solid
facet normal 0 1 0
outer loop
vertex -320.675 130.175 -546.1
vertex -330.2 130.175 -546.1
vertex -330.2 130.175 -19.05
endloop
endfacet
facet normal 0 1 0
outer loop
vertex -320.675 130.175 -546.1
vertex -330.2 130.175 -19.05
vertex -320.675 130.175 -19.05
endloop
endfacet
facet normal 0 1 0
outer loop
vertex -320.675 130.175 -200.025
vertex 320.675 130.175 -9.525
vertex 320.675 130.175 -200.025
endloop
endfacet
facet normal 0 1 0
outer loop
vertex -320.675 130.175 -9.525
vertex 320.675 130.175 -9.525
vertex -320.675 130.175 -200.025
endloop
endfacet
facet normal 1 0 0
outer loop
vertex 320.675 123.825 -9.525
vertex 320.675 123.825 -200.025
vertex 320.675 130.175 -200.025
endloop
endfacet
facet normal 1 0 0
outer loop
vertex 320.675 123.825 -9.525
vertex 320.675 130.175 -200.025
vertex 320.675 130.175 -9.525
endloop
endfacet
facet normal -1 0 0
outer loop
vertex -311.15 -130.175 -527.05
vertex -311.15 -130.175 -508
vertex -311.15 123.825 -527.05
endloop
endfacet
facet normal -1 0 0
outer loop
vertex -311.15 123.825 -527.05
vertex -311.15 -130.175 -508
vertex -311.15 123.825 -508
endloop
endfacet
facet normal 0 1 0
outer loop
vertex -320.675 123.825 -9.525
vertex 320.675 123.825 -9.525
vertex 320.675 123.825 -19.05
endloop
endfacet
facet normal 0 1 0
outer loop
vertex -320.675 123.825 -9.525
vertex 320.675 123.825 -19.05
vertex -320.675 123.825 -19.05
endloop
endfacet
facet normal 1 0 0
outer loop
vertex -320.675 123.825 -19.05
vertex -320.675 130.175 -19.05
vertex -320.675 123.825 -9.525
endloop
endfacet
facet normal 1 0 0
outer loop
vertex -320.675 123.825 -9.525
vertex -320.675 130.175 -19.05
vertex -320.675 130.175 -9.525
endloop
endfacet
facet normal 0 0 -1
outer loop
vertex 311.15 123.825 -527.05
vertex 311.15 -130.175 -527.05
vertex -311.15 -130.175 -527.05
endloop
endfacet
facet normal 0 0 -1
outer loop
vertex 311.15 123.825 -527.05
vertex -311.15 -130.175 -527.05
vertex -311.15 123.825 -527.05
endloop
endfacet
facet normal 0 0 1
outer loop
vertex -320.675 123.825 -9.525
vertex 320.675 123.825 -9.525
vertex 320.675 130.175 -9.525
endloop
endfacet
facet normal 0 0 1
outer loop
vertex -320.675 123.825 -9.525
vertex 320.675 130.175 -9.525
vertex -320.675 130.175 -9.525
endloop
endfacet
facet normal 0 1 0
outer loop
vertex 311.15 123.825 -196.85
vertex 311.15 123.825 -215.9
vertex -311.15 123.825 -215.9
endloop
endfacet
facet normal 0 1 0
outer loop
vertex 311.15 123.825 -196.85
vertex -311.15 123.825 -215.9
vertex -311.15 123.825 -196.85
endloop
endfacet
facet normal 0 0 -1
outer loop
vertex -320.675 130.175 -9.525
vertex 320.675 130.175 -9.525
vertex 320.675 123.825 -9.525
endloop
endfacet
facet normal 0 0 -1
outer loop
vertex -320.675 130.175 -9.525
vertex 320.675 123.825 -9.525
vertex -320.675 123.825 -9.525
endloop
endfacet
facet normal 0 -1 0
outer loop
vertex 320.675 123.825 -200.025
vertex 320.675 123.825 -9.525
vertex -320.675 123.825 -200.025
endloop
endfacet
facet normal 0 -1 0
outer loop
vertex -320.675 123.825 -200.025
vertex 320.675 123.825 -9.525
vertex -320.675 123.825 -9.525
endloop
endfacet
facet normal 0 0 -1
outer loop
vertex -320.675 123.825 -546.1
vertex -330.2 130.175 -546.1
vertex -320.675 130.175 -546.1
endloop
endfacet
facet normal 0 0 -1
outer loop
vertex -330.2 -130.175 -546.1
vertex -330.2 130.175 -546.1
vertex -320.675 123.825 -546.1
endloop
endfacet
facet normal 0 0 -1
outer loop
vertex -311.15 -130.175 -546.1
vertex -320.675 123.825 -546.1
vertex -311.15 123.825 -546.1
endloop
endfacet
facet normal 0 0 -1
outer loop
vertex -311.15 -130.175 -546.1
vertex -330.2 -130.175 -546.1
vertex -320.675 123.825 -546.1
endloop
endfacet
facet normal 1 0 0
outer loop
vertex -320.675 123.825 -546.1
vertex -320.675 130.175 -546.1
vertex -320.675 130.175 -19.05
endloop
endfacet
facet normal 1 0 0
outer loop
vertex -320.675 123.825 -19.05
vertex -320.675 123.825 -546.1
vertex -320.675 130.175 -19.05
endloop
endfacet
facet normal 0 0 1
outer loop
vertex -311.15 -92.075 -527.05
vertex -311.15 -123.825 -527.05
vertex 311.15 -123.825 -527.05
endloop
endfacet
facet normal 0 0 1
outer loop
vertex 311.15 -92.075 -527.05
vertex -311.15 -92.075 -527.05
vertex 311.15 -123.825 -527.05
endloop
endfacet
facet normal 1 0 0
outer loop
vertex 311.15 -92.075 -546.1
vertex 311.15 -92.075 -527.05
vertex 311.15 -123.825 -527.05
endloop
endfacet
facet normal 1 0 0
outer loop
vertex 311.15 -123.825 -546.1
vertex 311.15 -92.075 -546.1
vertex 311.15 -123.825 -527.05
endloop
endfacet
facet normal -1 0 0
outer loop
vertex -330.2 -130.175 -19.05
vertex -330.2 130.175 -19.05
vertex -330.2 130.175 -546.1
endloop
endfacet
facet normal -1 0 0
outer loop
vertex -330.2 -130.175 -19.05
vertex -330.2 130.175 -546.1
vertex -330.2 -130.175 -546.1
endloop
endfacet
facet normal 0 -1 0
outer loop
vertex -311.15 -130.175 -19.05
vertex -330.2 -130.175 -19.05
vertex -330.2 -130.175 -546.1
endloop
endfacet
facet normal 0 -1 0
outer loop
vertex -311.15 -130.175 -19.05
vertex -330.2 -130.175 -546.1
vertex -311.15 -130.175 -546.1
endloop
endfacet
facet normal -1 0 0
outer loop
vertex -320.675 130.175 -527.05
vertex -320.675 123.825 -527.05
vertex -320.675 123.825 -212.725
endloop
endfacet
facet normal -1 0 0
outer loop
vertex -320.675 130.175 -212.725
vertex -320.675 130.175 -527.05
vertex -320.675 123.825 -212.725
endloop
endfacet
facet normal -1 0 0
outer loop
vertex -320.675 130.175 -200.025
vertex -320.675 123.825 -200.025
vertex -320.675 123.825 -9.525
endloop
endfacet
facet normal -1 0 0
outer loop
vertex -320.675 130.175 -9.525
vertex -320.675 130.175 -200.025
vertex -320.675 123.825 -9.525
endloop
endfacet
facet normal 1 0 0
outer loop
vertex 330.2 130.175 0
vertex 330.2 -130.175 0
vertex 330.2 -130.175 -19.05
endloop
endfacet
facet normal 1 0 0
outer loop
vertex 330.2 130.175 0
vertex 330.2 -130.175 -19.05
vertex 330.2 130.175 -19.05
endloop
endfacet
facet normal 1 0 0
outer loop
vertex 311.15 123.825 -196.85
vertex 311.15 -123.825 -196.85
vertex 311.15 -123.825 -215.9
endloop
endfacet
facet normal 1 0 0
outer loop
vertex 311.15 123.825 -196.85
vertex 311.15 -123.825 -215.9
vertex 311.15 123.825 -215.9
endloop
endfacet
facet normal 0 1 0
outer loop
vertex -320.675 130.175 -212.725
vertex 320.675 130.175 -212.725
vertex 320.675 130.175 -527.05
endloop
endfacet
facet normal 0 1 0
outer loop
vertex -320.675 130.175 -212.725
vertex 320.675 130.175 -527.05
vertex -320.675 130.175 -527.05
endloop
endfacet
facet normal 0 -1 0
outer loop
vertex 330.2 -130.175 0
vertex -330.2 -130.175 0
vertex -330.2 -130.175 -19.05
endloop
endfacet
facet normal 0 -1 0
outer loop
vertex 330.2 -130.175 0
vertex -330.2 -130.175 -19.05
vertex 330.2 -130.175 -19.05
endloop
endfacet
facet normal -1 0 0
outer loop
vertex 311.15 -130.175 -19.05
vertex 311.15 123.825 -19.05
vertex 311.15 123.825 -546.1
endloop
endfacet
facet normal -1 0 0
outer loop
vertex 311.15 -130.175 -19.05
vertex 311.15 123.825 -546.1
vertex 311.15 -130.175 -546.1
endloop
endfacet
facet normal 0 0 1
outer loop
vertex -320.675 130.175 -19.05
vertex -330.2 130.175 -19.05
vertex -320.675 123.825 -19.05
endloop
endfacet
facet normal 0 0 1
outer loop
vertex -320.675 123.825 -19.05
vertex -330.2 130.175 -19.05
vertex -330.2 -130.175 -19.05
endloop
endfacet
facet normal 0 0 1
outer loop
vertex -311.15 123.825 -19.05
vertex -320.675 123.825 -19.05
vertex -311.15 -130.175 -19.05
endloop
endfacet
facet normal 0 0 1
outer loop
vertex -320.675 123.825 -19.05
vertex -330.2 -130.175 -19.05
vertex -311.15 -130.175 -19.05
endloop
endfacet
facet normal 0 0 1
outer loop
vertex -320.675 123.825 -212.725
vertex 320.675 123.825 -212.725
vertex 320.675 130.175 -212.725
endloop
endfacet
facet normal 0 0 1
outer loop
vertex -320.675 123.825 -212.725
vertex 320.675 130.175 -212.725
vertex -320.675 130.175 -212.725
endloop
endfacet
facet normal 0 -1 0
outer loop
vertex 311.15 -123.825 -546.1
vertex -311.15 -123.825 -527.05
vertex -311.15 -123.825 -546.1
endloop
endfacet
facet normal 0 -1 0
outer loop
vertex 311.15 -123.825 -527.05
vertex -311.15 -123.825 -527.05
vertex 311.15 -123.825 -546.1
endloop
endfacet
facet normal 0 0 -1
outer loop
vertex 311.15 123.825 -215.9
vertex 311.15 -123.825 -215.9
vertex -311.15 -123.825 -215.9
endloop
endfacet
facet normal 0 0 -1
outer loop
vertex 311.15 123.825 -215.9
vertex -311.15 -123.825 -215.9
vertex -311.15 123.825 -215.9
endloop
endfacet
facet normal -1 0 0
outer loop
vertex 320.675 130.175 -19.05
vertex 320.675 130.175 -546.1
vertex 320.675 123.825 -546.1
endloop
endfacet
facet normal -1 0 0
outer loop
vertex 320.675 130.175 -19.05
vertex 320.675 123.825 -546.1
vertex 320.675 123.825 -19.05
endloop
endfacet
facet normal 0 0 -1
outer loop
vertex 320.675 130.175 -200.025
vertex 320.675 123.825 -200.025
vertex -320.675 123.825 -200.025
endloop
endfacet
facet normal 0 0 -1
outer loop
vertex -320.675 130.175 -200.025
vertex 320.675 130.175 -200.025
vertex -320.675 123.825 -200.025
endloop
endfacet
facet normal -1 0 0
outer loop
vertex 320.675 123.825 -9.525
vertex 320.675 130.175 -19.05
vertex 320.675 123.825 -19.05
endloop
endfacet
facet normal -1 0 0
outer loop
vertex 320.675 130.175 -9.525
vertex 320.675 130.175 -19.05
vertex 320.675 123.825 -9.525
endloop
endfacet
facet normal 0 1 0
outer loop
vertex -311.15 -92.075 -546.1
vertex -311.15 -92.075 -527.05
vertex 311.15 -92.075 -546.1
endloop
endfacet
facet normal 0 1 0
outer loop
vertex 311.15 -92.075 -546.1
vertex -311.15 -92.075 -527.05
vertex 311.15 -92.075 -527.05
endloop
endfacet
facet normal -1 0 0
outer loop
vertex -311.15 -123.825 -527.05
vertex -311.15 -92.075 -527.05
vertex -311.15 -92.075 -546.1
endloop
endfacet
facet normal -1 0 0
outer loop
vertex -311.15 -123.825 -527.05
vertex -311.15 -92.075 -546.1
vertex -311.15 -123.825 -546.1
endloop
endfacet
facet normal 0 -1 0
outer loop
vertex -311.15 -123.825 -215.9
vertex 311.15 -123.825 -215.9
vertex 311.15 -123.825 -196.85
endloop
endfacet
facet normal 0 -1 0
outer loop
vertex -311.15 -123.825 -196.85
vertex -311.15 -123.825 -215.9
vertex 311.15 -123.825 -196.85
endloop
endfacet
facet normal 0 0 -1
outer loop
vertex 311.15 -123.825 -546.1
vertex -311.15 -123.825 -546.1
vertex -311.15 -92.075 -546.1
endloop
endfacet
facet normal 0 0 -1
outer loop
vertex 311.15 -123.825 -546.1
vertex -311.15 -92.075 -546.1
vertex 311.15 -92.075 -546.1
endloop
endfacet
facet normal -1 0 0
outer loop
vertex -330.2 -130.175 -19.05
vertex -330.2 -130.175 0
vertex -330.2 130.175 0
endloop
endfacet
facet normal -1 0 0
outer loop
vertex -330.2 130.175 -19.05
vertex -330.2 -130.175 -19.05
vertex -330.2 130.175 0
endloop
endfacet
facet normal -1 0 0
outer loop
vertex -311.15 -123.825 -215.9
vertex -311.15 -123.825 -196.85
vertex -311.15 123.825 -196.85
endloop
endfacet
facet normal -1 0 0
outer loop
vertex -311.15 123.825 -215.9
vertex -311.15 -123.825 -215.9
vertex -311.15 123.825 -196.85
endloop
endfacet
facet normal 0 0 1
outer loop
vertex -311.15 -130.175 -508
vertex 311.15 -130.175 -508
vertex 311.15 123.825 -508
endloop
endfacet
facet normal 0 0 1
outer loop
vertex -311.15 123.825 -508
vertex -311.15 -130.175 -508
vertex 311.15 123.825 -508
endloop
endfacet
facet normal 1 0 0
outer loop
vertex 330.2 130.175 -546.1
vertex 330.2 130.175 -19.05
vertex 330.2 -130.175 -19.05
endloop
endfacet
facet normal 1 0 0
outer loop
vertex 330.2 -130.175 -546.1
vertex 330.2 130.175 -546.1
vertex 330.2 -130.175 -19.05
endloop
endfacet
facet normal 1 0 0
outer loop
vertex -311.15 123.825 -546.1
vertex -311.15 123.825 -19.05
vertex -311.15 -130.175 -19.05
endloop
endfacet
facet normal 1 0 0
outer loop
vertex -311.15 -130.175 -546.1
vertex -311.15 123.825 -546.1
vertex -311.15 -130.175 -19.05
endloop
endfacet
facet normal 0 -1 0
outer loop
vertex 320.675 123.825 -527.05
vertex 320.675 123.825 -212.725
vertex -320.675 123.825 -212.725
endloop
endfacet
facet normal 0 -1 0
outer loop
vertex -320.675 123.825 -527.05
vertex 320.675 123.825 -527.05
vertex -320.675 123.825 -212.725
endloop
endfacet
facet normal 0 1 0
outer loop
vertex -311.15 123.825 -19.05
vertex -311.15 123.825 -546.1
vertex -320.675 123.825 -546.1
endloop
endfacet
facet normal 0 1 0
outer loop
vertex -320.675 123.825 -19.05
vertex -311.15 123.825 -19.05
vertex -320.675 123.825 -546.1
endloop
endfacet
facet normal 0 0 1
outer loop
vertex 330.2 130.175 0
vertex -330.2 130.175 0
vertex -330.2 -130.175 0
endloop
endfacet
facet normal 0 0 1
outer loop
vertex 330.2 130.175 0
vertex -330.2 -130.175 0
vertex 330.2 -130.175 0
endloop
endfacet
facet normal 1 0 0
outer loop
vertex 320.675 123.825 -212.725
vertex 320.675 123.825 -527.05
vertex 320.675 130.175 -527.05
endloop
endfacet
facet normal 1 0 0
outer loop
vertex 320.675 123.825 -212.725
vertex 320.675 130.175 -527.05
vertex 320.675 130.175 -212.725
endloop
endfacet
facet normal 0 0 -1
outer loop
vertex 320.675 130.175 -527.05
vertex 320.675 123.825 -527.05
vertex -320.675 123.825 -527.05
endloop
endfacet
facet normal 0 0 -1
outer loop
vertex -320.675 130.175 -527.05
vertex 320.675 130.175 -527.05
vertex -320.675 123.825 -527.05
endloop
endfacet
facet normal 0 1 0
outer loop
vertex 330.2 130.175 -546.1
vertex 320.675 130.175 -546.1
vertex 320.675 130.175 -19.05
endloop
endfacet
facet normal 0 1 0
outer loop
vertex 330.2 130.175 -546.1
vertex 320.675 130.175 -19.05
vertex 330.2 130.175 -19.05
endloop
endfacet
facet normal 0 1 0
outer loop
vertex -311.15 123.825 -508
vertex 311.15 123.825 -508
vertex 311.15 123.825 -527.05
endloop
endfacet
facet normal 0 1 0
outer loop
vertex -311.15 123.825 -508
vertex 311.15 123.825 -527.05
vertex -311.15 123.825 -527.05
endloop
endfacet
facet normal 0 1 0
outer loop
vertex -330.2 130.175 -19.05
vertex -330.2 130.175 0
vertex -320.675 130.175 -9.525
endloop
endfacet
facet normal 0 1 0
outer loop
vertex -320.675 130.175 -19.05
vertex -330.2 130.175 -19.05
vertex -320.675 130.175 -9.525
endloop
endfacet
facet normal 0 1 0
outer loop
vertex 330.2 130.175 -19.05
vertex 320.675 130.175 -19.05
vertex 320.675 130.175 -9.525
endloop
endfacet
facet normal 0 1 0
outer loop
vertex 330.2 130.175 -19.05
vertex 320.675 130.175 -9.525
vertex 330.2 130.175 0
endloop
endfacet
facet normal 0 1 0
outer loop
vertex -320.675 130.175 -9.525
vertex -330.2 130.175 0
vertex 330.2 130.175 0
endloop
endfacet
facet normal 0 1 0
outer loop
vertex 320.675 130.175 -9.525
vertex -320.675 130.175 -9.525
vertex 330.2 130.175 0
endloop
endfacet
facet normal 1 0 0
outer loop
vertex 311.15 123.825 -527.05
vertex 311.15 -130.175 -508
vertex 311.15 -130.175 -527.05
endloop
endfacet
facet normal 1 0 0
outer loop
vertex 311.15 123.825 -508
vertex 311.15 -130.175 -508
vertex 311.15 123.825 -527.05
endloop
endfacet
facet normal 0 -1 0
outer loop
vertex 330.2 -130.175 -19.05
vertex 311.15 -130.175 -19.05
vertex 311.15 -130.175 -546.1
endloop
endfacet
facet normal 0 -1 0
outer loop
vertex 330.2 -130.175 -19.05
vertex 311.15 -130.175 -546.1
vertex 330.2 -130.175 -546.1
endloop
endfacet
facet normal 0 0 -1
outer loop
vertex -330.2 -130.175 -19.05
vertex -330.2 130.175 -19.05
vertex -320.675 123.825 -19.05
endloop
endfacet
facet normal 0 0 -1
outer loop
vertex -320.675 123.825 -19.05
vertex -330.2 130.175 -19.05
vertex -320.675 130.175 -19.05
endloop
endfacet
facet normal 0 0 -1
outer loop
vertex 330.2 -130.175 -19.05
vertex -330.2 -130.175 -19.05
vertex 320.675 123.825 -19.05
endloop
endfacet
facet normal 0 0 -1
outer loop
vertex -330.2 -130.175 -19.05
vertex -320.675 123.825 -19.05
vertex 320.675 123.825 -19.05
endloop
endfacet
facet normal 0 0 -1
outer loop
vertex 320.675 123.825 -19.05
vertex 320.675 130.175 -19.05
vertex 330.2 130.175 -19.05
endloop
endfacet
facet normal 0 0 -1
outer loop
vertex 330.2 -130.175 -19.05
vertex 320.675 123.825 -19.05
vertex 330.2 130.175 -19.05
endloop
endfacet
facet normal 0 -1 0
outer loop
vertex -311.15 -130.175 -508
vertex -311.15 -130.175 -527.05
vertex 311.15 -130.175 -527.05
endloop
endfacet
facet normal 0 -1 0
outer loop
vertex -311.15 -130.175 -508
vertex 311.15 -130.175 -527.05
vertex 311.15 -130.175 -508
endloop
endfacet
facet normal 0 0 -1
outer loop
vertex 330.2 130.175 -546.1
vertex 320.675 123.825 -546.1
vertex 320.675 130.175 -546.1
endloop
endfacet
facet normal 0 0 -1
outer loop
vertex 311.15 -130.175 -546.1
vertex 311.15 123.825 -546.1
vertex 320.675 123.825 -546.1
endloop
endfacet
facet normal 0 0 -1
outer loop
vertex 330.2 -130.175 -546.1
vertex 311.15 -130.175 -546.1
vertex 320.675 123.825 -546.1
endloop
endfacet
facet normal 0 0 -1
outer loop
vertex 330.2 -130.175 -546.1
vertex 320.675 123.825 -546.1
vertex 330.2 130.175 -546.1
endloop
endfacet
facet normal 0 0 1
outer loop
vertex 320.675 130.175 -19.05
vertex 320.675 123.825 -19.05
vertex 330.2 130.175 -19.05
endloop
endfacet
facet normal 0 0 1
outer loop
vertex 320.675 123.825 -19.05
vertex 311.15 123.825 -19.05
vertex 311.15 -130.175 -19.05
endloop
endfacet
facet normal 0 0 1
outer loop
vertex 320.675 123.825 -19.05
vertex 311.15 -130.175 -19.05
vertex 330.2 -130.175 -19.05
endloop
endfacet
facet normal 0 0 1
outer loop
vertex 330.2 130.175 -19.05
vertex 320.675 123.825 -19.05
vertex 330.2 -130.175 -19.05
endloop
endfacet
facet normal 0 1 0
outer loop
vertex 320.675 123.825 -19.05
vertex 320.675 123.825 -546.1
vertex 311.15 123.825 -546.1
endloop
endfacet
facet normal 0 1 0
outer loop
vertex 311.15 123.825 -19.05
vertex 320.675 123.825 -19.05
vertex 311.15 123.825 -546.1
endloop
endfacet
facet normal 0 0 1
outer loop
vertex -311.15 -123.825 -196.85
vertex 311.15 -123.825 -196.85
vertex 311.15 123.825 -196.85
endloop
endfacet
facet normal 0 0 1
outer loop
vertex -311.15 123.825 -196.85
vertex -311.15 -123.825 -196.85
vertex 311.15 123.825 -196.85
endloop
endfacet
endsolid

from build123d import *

# Parameters (mm, degrees)
F0_W      = 660.4
F0_H      = 260.35
F1_DEPTH  = 19.05
F2_W      = 19.05
F2_H      = 260.35
F3_DEPTH  = 527.05
F4_W      = 260.35
F4_H      = 19.05
F5_DEPTH  = 622.3
F6_W      = 622.3
F6_H      = 31.75
F7_DEPTH  = 19.05
F8_W      = 641.35
F8_H      = 536.575
F9_DEPTH  = 6.35
F10_W     = 247.65
F10_H     = 19.05
F11_DEPTH = 622.3
F12_W     = 641.35
F12_H     = 190.5
F12_H_2   = 314.325
F13_DEPTH = 6.35


with BuildPart() as f1:
    # F0 (on Top) → F1 (new body)
    with BuildSketch(Plane.XY):
        Rectangle(F0_W, F0_H)
    extrude(amount=-F1_DEPTH)


with BuildPart() as f3:
    # F2 (on face) → F3 (new body)
    with BuildSketch(Plane(origin=(0, 0, -19.05), x_dir=(1, 0, 0), z_dir=(0, 0, -1))):
        with Locations((-320.675, 0)):
            Rectangle(F2_W, F2_H)
        with Locations((320.675, 0)):
            Rectangle(F2_W, F2_H)
    extrude(amount=F3_DEPTH)


with BuildPart() as f5:
    # F4 (on face) → F5 (new body, through all)
    with BuildSketch(Plane.YZ.offset(-311.15)):
        with Locations((0, -517.525)):
            Rectangle(F4_W, F4_H)
    extrude(amount=F5_DEPTH)


with BuildPart() as f7:
    # F6 (on face) → F7 (new body, through all)
    with BuildSketch(Plane(origin=(0, 0, -527.05), x_dir=(1, 0, 0), z_dir=(0, 0, -1))):
        with Locations((0, 107.95)):
            Rectangle(F6_W, F6_H)
    extrude(amount=F7_DEPTH)


with BuildPart() as f9_tool:
    # F8 (on face) → F9 (new body)
    with BuildSketch(Plane(origin=(0, 130.175, 0), x_dir=(-1, 0, 0), z_dir=(0, 1, 0))):
        with Locations((0, -277.8125)):
            Rectangle(F8_W, F8_H)
    extrude(amount=-F9_DEPTH)


with BuildPart() as f1_1:
    add(f1.part)

    # F9: cut by f9_tool
    add(f9_tool.part, mode=Mode.SUBTRACT)


with BuildPart() as f3_1:
    add(f3.part)

    # F9: cut by f9_tool
    add(f9_tool.part, mode=Mode.SUBTRACT)


with BuildPart() as f5_1:
    add(f5.part)

    # F9: cut by f9_tool
    add(f9_tool.part, mode=Mode.SUBTRACT)


with BuildPart() as f11:
    # F10 (on face) → F11 (new body, through all)
    with BuildSketch(Plane.YZ.offset(-311.15)):
        with Locations((0, -206.375)):
            Rectangle(F10_W, F10_H)
    extrude(amount=F11_DEPTH)


with BuildPart() as f13:
    # F12 (on face) → F13 (new body, through all)
    with BuildSketch(Plane(origin=(0, 123.825, 0), x_dir=(-1, 0, 0), z_dir=(0, 1, 0))):
        with Locations((0, -104.775)):
            Rectangle(F12_W, F12_H)
        with Locations((0, -369.8875)):
            Rectangle(F12_W, F12_H_2)
    extrude(amount=F13_DEPTH)


solid = Compound([f7.part, f1_1.part, f3_1.part, f5_1.part, f11.part, f13.part])
